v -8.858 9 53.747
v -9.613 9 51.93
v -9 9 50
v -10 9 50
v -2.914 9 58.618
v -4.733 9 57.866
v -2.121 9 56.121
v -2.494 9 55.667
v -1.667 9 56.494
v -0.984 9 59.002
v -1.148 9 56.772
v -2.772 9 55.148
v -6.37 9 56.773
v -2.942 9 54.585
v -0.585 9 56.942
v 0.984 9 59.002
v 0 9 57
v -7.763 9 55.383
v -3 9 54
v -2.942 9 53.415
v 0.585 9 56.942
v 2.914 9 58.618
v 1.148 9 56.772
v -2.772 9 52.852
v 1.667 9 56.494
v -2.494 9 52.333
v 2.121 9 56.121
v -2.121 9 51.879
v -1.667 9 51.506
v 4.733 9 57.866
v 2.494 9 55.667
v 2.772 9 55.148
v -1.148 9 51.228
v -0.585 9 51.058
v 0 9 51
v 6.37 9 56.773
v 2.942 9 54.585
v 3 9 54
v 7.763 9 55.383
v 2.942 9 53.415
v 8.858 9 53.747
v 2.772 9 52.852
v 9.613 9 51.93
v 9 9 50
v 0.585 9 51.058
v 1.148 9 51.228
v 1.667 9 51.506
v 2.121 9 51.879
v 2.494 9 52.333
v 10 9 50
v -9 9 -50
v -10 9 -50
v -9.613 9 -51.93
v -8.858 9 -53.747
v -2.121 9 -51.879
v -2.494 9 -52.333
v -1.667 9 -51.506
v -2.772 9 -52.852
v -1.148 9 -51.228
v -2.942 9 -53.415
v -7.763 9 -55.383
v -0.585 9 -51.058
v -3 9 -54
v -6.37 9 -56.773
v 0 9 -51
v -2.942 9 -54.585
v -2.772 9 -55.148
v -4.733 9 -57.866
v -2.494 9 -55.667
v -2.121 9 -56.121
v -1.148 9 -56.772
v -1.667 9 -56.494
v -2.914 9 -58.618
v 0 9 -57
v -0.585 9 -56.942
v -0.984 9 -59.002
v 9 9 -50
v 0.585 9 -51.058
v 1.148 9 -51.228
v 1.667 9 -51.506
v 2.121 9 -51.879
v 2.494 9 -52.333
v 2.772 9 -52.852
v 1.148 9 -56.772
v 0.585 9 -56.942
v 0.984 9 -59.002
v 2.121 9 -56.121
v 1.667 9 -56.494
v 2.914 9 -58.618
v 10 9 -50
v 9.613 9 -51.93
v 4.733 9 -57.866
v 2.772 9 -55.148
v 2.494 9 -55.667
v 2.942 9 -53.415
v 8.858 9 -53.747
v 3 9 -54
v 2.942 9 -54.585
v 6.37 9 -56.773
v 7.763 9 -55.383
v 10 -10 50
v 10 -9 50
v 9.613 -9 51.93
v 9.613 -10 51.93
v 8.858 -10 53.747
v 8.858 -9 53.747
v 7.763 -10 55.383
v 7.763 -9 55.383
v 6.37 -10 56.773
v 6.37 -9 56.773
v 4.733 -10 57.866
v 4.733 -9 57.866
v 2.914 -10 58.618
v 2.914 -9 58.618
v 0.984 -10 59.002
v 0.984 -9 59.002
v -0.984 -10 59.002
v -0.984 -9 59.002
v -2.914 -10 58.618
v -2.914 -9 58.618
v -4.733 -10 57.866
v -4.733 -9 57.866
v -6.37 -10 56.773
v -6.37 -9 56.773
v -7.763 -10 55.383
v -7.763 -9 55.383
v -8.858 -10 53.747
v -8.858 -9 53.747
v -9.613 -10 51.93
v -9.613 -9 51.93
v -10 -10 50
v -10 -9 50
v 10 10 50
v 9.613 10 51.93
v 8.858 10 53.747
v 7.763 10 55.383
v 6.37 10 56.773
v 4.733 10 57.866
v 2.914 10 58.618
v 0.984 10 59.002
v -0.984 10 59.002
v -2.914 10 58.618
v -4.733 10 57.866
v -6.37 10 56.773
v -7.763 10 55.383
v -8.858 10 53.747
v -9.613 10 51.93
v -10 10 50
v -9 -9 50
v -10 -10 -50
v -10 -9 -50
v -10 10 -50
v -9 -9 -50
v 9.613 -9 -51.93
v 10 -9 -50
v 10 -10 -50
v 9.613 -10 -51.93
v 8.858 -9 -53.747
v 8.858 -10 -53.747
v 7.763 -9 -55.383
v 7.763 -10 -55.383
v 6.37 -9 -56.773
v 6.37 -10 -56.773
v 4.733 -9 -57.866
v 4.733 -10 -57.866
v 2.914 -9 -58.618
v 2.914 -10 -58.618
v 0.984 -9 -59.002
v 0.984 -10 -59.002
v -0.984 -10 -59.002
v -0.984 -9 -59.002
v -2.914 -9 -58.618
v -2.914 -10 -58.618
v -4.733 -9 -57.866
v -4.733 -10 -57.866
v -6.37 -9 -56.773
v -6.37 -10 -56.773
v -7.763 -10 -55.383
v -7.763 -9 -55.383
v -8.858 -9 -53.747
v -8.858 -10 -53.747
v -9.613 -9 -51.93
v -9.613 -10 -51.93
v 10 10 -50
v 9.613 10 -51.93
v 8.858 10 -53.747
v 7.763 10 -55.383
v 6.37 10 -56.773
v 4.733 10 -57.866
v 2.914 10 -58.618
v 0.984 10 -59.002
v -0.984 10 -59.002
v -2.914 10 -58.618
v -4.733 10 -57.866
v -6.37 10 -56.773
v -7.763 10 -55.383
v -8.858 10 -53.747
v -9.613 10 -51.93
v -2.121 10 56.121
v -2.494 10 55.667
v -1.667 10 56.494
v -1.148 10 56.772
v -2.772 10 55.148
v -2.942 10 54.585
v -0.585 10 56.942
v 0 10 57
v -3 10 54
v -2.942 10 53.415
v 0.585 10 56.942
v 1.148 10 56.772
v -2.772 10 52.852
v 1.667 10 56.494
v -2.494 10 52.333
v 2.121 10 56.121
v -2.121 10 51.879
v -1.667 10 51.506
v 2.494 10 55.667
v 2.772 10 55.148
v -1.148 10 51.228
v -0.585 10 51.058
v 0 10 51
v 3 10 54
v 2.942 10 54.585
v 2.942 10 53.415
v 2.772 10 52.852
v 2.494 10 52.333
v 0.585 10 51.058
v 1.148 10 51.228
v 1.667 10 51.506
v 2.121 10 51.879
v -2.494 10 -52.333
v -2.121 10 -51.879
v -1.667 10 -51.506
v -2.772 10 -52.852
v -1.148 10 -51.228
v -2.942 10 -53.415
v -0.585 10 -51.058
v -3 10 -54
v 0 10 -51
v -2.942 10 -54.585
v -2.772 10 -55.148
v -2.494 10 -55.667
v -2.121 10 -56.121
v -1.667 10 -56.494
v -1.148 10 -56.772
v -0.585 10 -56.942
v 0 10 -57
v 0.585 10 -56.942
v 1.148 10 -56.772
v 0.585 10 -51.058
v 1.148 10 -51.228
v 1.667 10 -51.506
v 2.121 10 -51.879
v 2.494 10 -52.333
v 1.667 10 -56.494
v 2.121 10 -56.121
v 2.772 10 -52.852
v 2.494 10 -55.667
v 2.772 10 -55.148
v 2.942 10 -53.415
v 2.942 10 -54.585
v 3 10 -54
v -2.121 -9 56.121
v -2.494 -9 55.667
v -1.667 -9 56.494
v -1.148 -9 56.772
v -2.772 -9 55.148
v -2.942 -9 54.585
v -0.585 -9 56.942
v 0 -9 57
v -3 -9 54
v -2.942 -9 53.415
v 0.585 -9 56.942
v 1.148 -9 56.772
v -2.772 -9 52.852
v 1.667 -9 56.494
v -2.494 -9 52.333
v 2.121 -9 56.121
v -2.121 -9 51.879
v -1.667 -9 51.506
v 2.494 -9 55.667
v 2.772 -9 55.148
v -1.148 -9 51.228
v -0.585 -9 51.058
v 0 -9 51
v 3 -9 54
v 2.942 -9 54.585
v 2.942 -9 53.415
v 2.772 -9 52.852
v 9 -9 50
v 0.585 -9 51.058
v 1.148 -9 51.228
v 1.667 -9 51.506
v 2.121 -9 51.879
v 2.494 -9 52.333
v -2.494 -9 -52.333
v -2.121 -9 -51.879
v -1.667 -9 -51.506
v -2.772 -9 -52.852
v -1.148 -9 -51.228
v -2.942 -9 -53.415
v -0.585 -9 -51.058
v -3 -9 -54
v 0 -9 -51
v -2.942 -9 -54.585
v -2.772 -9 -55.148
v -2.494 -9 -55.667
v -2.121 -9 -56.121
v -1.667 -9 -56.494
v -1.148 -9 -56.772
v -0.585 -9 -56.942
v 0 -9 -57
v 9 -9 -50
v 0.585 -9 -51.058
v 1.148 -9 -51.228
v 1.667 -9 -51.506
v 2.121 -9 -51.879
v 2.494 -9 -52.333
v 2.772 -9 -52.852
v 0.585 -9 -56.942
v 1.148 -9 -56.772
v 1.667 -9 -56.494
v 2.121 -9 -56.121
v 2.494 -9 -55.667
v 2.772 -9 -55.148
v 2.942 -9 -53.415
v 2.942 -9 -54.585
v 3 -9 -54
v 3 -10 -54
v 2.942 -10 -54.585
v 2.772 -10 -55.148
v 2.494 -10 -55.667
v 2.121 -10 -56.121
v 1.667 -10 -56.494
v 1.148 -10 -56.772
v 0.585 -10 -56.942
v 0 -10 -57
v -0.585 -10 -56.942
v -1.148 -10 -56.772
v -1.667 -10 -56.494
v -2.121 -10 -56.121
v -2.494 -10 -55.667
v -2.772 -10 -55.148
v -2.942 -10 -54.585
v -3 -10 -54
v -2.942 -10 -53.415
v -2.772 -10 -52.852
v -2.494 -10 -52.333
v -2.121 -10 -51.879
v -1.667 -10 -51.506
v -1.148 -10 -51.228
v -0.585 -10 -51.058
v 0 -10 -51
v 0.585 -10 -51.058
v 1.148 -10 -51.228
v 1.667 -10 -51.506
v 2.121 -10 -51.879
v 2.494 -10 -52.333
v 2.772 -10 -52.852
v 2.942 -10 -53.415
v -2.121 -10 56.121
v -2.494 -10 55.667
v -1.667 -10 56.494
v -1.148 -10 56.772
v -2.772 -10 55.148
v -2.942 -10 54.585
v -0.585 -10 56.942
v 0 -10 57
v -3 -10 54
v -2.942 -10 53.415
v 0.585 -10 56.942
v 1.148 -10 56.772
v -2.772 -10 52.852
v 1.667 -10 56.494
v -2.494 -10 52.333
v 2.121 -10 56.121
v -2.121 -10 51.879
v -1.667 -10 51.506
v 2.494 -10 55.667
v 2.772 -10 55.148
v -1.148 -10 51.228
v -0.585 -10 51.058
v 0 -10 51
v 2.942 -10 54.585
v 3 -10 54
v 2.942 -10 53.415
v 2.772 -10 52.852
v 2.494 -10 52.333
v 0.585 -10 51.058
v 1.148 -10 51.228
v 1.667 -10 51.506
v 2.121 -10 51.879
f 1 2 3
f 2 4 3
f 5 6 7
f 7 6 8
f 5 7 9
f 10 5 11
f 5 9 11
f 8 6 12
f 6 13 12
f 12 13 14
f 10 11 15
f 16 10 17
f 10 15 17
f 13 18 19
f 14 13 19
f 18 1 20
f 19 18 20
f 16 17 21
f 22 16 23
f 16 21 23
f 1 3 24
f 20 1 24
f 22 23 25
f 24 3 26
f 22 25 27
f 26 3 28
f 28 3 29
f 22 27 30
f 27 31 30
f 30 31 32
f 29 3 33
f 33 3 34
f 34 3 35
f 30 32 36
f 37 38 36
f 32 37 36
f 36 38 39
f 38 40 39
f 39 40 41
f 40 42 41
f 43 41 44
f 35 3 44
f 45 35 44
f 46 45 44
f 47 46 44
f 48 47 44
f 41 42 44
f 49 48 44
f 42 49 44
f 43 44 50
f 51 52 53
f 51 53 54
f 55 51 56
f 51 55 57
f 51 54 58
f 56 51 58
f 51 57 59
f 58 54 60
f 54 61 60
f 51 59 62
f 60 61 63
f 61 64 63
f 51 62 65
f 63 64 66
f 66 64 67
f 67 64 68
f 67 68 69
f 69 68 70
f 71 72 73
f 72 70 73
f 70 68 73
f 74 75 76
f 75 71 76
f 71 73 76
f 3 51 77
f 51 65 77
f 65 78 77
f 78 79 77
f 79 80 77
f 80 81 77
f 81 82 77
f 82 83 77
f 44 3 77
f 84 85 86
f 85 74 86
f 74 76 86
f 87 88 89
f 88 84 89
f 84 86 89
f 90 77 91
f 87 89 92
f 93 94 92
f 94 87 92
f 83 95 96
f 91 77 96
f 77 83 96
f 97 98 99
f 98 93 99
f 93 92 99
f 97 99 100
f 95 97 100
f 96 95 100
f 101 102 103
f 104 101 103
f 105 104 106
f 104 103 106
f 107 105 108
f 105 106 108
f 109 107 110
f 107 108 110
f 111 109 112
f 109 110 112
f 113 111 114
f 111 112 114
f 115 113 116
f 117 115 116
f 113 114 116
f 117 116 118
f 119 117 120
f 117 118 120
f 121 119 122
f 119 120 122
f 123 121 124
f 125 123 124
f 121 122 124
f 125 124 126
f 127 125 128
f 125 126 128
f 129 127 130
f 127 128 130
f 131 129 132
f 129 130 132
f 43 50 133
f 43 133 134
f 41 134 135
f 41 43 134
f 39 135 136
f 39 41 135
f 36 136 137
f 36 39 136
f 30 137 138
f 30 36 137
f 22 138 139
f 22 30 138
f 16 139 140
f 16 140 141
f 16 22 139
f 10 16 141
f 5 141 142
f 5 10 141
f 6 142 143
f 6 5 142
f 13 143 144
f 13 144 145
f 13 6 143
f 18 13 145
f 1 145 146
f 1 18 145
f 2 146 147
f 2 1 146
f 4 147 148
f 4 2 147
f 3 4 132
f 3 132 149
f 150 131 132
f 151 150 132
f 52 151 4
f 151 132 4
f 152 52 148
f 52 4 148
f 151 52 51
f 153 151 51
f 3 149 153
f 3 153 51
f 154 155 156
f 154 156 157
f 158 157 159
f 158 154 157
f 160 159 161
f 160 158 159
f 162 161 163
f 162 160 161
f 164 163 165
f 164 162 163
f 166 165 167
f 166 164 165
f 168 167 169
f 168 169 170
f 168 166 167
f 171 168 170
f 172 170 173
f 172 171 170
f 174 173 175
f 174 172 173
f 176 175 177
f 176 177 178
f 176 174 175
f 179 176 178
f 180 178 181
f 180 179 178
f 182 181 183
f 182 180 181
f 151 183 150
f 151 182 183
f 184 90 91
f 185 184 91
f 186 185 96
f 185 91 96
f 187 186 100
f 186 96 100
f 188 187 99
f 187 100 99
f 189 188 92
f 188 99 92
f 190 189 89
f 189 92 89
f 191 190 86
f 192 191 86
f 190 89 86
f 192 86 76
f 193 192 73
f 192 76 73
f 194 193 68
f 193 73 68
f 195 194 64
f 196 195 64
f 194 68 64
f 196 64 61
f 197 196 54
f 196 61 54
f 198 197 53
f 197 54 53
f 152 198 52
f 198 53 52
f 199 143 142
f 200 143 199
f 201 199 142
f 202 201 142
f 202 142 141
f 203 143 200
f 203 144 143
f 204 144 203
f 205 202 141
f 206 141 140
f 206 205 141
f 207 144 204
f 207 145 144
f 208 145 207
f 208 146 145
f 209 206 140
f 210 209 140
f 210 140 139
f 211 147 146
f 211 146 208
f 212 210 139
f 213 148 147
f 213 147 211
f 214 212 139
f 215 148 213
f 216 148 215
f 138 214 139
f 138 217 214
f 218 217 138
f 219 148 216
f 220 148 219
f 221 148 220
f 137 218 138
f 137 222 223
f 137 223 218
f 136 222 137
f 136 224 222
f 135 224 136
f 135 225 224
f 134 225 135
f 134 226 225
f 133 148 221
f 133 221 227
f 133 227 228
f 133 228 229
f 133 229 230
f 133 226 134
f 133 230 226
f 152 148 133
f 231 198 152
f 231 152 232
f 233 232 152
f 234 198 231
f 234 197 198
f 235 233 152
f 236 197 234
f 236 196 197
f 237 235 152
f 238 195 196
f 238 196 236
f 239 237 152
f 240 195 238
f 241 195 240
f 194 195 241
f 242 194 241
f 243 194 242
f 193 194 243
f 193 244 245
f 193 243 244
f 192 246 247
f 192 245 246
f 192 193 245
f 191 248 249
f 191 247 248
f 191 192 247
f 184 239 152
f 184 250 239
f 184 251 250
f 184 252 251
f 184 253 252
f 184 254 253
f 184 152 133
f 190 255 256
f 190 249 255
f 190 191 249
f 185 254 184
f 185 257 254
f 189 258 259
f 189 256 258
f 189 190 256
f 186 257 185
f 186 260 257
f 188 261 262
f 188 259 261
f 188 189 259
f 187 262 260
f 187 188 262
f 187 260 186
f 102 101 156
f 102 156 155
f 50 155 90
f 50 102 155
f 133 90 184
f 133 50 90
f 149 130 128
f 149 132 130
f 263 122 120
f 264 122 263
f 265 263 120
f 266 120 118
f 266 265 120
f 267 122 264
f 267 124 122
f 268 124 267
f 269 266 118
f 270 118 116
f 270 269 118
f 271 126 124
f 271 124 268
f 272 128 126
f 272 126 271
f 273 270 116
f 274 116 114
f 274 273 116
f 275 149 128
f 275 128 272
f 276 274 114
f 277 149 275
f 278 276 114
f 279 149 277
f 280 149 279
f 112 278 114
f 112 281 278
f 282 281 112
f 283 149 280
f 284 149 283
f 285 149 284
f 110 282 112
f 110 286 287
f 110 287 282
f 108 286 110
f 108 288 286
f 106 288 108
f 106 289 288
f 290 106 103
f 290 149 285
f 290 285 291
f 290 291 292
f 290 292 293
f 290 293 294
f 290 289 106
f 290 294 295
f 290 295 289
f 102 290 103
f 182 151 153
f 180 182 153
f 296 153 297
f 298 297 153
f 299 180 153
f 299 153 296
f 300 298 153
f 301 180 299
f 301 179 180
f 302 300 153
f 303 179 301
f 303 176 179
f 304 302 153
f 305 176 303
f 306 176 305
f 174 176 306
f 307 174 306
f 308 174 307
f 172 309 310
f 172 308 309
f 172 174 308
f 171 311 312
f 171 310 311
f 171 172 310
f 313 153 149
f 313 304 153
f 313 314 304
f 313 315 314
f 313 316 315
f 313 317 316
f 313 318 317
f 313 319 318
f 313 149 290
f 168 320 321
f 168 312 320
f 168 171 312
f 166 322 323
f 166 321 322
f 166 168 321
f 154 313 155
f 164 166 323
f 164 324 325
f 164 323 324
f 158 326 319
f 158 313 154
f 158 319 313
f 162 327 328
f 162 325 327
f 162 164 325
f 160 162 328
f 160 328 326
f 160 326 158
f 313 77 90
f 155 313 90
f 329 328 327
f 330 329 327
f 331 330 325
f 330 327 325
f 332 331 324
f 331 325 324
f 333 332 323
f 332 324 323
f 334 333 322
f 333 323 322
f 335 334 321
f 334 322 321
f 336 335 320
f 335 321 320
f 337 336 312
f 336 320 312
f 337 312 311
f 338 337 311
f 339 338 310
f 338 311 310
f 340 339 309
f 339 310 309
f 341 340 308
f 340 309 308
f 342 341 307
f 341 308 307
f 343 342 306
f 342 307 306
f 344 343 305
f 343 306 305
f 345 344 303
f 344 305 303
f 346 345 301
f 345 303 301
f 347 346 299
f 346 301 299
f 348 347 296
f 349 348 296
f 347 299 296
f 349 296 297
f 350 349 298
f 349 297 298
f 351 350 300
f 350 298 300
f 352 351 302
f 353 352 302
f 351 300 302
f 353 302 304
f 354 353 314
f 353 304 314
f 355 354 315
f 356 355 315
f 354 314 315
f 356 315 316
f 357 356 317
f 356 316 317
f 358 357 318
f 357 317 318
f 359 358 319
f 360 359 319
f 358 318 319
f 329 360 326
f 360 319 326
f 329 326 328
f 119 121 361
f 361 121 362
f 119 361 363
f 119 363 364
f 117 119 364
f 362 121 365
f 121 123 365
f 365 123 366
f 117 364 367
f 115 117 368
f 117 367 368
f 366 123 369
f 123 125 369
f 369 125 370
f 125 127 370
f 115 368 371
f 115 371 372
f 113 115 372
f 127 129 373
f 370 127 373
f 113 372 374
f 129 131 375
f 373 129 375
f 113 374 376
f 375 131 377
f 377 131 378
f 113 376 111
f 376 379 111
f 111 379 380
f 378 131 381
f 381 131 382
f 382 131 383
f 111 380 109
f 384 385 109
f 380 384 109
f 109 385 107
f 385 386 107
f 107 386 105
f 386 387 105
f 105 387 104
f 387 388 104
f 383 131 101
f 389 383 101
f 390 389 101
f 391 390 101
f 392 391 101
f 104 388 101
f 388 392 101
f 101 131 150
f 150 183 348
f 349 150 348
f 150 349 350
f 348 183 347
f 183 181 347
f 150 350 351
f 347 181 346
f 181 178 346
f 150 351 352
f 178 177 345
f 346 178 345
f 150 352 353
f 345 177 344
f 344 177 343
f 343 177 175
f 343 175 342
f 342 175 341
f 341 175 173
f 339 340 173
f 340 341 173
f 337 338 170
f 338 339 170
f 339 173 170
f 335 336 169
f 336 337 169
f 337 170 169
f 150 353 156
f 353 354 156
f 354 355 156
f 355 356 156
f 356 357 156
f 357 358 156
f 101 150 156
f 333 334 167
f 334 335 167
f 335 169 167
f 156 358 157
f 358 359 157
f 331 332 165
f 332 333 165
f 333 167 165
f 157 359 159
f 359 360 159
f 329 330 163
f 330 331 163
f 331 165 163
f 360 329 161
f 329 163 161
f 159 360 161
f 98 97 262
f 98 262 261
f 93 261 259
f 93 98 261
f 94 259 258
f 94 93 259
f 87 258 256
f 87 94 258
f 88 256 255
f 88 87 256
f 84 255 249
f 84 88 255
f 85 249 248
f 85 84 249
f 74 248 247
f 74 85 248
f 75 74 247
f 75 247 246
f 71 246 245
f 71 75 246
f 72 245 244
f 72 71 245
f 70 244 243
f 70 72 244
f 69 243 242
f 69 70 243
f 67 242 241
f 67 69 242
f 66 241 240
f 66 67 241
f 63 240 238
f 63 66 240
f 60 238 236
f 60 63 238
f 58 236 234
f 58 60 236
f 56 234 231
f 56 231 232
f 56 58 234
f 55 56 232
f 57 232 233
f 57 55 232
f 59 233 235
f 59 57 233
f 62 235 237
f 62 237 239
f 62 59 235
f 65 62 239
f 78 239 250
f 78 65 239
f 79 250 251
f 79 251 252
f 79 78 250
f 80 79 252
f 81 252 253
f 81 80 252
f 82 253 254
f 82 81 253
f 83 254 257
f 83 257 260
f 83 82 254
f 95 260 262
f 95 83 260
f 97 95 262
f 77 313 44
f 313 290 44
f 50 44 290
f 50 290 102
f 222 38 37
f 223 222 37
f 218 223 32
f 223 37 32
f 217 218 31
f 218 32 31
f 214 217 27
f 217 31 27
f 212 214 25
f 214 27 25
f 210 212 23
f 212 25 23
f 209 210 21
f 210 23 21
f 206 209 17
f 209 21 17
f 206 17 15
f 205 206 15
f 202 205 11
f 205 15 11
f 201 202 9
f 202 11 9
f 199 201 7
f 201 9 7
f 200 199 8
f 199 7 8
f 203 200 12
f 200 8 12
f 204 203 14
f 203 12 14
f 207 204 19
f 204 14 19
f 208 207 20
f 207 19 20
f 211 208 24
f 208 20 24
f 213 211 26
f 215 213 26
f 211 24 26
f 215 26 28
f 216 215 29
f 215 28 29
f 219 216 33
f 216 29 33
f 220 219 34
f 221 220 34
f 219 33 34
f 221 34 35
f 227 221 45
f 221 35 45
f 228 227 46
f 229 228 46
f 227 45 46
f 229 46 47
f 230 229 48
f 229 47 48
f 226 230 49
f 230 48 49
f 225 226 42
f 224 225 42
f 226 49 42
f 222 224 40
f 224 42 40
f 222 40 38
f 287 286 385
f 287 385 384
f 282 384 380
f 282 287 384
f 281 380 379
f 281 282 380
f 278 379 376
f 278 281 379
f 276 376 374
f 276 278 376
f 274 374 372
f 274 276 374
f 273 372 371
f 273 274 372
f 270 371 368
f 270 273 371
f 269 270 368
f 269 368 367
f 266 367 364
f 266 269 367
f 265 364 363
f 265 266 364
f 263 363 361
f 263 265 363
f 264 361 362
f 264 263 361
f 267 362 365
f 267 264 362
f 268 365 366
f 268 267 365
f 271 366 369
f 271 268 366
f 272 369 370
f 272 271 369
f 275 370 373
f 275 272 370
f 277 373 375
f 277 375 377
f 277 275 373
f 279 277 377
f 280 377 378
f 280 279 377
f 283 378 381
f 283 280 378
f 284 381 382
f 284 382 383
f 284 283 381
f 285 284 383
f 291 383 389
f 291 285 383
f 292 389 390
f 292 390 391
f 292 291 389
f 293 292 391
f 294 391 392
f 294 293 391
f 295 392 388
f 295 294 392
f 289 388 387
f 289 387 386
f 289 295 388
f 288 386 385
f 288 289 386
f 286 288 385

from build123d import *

# Parameters (mm, degrees)
SKETCH1_W               = 20
SKETCH1_H               = 20
SKETCH1_W_2             = 18
SKETCH1_H_2             = 18
BOSS_EXTRUDE1_DEPTH     = 50
BOSS_EXTRUDE2_START     = -1
SKETCH2_R               = 3
BOSS_EXTRUDE2_DEPTH     = 1
MIRROR2_START           = -1
MIRROR2_COPY_1_SKETCH_R = 3
MIRROR2_COPY_1_DEPTH    = 1


with BuildPart() as part:
    # Sketch1 → Boss-Extrude1 (new body, symmetric)
    with BuildSketch(Plane.XY):
        Rectangle(SKETCH1_W, SKETCH1_H)
        Rectangle(SKETCH1_W_2, SKETCH1_H_2, mode=Mode.SUBTRACT)
    extrude(amount=BOSS_EXTRUDE1_DEPTH, both=True)

    # Sketch2 → Boss-Extrude2 (add)
    with BuildSketch(Plane.XZ.offset(10).offset(BOSS_EXTRUDE2_START)):
        with BuildLine():
            Line((-10, 50), (10, 50))
            ThreePointArc((10, 50), (0, 59.049875621), (-10, 50))
        make_face()
        with Locations((0, 54)):
            Circle(SKETCH2_R, mode=Mode.SUBTRACT)
    boss_extrude2 = extrude(amount=BOSS_EXTRUDE2_DEPTH)

    # Mirror1: Boss-Extrude2 across plane
    add(boss_extrude2.mirror(Plane.XY))

    # Mirror2: Boss-Extrude2 across plane
    add(boss_extrude2.mirror(Plane.ZX))

    # Mirror2 copy 1 sketch → Mirror2 copy 1 (add)
    with BuildSketch(Plane(origin=(0, 10, 0), x_dir=(1, 0, 0), z_dir=(0, 1, 0)).offset(MIRROR2_START)):
        with BuildLine():
            Line((-10, 50), (10, 50))
            ThreePointArc((10, 50), (0, 59.049875621), (-10, 50))
        make_face()
        with Locations((0, 54)):
            Circle(MIRROR2_COPY_1_SKETCH_R, mode=Mode.SUBTRACT)
    extrude(amount=MIRROR2_COPY_1_DEPTH)


solid = part.part
